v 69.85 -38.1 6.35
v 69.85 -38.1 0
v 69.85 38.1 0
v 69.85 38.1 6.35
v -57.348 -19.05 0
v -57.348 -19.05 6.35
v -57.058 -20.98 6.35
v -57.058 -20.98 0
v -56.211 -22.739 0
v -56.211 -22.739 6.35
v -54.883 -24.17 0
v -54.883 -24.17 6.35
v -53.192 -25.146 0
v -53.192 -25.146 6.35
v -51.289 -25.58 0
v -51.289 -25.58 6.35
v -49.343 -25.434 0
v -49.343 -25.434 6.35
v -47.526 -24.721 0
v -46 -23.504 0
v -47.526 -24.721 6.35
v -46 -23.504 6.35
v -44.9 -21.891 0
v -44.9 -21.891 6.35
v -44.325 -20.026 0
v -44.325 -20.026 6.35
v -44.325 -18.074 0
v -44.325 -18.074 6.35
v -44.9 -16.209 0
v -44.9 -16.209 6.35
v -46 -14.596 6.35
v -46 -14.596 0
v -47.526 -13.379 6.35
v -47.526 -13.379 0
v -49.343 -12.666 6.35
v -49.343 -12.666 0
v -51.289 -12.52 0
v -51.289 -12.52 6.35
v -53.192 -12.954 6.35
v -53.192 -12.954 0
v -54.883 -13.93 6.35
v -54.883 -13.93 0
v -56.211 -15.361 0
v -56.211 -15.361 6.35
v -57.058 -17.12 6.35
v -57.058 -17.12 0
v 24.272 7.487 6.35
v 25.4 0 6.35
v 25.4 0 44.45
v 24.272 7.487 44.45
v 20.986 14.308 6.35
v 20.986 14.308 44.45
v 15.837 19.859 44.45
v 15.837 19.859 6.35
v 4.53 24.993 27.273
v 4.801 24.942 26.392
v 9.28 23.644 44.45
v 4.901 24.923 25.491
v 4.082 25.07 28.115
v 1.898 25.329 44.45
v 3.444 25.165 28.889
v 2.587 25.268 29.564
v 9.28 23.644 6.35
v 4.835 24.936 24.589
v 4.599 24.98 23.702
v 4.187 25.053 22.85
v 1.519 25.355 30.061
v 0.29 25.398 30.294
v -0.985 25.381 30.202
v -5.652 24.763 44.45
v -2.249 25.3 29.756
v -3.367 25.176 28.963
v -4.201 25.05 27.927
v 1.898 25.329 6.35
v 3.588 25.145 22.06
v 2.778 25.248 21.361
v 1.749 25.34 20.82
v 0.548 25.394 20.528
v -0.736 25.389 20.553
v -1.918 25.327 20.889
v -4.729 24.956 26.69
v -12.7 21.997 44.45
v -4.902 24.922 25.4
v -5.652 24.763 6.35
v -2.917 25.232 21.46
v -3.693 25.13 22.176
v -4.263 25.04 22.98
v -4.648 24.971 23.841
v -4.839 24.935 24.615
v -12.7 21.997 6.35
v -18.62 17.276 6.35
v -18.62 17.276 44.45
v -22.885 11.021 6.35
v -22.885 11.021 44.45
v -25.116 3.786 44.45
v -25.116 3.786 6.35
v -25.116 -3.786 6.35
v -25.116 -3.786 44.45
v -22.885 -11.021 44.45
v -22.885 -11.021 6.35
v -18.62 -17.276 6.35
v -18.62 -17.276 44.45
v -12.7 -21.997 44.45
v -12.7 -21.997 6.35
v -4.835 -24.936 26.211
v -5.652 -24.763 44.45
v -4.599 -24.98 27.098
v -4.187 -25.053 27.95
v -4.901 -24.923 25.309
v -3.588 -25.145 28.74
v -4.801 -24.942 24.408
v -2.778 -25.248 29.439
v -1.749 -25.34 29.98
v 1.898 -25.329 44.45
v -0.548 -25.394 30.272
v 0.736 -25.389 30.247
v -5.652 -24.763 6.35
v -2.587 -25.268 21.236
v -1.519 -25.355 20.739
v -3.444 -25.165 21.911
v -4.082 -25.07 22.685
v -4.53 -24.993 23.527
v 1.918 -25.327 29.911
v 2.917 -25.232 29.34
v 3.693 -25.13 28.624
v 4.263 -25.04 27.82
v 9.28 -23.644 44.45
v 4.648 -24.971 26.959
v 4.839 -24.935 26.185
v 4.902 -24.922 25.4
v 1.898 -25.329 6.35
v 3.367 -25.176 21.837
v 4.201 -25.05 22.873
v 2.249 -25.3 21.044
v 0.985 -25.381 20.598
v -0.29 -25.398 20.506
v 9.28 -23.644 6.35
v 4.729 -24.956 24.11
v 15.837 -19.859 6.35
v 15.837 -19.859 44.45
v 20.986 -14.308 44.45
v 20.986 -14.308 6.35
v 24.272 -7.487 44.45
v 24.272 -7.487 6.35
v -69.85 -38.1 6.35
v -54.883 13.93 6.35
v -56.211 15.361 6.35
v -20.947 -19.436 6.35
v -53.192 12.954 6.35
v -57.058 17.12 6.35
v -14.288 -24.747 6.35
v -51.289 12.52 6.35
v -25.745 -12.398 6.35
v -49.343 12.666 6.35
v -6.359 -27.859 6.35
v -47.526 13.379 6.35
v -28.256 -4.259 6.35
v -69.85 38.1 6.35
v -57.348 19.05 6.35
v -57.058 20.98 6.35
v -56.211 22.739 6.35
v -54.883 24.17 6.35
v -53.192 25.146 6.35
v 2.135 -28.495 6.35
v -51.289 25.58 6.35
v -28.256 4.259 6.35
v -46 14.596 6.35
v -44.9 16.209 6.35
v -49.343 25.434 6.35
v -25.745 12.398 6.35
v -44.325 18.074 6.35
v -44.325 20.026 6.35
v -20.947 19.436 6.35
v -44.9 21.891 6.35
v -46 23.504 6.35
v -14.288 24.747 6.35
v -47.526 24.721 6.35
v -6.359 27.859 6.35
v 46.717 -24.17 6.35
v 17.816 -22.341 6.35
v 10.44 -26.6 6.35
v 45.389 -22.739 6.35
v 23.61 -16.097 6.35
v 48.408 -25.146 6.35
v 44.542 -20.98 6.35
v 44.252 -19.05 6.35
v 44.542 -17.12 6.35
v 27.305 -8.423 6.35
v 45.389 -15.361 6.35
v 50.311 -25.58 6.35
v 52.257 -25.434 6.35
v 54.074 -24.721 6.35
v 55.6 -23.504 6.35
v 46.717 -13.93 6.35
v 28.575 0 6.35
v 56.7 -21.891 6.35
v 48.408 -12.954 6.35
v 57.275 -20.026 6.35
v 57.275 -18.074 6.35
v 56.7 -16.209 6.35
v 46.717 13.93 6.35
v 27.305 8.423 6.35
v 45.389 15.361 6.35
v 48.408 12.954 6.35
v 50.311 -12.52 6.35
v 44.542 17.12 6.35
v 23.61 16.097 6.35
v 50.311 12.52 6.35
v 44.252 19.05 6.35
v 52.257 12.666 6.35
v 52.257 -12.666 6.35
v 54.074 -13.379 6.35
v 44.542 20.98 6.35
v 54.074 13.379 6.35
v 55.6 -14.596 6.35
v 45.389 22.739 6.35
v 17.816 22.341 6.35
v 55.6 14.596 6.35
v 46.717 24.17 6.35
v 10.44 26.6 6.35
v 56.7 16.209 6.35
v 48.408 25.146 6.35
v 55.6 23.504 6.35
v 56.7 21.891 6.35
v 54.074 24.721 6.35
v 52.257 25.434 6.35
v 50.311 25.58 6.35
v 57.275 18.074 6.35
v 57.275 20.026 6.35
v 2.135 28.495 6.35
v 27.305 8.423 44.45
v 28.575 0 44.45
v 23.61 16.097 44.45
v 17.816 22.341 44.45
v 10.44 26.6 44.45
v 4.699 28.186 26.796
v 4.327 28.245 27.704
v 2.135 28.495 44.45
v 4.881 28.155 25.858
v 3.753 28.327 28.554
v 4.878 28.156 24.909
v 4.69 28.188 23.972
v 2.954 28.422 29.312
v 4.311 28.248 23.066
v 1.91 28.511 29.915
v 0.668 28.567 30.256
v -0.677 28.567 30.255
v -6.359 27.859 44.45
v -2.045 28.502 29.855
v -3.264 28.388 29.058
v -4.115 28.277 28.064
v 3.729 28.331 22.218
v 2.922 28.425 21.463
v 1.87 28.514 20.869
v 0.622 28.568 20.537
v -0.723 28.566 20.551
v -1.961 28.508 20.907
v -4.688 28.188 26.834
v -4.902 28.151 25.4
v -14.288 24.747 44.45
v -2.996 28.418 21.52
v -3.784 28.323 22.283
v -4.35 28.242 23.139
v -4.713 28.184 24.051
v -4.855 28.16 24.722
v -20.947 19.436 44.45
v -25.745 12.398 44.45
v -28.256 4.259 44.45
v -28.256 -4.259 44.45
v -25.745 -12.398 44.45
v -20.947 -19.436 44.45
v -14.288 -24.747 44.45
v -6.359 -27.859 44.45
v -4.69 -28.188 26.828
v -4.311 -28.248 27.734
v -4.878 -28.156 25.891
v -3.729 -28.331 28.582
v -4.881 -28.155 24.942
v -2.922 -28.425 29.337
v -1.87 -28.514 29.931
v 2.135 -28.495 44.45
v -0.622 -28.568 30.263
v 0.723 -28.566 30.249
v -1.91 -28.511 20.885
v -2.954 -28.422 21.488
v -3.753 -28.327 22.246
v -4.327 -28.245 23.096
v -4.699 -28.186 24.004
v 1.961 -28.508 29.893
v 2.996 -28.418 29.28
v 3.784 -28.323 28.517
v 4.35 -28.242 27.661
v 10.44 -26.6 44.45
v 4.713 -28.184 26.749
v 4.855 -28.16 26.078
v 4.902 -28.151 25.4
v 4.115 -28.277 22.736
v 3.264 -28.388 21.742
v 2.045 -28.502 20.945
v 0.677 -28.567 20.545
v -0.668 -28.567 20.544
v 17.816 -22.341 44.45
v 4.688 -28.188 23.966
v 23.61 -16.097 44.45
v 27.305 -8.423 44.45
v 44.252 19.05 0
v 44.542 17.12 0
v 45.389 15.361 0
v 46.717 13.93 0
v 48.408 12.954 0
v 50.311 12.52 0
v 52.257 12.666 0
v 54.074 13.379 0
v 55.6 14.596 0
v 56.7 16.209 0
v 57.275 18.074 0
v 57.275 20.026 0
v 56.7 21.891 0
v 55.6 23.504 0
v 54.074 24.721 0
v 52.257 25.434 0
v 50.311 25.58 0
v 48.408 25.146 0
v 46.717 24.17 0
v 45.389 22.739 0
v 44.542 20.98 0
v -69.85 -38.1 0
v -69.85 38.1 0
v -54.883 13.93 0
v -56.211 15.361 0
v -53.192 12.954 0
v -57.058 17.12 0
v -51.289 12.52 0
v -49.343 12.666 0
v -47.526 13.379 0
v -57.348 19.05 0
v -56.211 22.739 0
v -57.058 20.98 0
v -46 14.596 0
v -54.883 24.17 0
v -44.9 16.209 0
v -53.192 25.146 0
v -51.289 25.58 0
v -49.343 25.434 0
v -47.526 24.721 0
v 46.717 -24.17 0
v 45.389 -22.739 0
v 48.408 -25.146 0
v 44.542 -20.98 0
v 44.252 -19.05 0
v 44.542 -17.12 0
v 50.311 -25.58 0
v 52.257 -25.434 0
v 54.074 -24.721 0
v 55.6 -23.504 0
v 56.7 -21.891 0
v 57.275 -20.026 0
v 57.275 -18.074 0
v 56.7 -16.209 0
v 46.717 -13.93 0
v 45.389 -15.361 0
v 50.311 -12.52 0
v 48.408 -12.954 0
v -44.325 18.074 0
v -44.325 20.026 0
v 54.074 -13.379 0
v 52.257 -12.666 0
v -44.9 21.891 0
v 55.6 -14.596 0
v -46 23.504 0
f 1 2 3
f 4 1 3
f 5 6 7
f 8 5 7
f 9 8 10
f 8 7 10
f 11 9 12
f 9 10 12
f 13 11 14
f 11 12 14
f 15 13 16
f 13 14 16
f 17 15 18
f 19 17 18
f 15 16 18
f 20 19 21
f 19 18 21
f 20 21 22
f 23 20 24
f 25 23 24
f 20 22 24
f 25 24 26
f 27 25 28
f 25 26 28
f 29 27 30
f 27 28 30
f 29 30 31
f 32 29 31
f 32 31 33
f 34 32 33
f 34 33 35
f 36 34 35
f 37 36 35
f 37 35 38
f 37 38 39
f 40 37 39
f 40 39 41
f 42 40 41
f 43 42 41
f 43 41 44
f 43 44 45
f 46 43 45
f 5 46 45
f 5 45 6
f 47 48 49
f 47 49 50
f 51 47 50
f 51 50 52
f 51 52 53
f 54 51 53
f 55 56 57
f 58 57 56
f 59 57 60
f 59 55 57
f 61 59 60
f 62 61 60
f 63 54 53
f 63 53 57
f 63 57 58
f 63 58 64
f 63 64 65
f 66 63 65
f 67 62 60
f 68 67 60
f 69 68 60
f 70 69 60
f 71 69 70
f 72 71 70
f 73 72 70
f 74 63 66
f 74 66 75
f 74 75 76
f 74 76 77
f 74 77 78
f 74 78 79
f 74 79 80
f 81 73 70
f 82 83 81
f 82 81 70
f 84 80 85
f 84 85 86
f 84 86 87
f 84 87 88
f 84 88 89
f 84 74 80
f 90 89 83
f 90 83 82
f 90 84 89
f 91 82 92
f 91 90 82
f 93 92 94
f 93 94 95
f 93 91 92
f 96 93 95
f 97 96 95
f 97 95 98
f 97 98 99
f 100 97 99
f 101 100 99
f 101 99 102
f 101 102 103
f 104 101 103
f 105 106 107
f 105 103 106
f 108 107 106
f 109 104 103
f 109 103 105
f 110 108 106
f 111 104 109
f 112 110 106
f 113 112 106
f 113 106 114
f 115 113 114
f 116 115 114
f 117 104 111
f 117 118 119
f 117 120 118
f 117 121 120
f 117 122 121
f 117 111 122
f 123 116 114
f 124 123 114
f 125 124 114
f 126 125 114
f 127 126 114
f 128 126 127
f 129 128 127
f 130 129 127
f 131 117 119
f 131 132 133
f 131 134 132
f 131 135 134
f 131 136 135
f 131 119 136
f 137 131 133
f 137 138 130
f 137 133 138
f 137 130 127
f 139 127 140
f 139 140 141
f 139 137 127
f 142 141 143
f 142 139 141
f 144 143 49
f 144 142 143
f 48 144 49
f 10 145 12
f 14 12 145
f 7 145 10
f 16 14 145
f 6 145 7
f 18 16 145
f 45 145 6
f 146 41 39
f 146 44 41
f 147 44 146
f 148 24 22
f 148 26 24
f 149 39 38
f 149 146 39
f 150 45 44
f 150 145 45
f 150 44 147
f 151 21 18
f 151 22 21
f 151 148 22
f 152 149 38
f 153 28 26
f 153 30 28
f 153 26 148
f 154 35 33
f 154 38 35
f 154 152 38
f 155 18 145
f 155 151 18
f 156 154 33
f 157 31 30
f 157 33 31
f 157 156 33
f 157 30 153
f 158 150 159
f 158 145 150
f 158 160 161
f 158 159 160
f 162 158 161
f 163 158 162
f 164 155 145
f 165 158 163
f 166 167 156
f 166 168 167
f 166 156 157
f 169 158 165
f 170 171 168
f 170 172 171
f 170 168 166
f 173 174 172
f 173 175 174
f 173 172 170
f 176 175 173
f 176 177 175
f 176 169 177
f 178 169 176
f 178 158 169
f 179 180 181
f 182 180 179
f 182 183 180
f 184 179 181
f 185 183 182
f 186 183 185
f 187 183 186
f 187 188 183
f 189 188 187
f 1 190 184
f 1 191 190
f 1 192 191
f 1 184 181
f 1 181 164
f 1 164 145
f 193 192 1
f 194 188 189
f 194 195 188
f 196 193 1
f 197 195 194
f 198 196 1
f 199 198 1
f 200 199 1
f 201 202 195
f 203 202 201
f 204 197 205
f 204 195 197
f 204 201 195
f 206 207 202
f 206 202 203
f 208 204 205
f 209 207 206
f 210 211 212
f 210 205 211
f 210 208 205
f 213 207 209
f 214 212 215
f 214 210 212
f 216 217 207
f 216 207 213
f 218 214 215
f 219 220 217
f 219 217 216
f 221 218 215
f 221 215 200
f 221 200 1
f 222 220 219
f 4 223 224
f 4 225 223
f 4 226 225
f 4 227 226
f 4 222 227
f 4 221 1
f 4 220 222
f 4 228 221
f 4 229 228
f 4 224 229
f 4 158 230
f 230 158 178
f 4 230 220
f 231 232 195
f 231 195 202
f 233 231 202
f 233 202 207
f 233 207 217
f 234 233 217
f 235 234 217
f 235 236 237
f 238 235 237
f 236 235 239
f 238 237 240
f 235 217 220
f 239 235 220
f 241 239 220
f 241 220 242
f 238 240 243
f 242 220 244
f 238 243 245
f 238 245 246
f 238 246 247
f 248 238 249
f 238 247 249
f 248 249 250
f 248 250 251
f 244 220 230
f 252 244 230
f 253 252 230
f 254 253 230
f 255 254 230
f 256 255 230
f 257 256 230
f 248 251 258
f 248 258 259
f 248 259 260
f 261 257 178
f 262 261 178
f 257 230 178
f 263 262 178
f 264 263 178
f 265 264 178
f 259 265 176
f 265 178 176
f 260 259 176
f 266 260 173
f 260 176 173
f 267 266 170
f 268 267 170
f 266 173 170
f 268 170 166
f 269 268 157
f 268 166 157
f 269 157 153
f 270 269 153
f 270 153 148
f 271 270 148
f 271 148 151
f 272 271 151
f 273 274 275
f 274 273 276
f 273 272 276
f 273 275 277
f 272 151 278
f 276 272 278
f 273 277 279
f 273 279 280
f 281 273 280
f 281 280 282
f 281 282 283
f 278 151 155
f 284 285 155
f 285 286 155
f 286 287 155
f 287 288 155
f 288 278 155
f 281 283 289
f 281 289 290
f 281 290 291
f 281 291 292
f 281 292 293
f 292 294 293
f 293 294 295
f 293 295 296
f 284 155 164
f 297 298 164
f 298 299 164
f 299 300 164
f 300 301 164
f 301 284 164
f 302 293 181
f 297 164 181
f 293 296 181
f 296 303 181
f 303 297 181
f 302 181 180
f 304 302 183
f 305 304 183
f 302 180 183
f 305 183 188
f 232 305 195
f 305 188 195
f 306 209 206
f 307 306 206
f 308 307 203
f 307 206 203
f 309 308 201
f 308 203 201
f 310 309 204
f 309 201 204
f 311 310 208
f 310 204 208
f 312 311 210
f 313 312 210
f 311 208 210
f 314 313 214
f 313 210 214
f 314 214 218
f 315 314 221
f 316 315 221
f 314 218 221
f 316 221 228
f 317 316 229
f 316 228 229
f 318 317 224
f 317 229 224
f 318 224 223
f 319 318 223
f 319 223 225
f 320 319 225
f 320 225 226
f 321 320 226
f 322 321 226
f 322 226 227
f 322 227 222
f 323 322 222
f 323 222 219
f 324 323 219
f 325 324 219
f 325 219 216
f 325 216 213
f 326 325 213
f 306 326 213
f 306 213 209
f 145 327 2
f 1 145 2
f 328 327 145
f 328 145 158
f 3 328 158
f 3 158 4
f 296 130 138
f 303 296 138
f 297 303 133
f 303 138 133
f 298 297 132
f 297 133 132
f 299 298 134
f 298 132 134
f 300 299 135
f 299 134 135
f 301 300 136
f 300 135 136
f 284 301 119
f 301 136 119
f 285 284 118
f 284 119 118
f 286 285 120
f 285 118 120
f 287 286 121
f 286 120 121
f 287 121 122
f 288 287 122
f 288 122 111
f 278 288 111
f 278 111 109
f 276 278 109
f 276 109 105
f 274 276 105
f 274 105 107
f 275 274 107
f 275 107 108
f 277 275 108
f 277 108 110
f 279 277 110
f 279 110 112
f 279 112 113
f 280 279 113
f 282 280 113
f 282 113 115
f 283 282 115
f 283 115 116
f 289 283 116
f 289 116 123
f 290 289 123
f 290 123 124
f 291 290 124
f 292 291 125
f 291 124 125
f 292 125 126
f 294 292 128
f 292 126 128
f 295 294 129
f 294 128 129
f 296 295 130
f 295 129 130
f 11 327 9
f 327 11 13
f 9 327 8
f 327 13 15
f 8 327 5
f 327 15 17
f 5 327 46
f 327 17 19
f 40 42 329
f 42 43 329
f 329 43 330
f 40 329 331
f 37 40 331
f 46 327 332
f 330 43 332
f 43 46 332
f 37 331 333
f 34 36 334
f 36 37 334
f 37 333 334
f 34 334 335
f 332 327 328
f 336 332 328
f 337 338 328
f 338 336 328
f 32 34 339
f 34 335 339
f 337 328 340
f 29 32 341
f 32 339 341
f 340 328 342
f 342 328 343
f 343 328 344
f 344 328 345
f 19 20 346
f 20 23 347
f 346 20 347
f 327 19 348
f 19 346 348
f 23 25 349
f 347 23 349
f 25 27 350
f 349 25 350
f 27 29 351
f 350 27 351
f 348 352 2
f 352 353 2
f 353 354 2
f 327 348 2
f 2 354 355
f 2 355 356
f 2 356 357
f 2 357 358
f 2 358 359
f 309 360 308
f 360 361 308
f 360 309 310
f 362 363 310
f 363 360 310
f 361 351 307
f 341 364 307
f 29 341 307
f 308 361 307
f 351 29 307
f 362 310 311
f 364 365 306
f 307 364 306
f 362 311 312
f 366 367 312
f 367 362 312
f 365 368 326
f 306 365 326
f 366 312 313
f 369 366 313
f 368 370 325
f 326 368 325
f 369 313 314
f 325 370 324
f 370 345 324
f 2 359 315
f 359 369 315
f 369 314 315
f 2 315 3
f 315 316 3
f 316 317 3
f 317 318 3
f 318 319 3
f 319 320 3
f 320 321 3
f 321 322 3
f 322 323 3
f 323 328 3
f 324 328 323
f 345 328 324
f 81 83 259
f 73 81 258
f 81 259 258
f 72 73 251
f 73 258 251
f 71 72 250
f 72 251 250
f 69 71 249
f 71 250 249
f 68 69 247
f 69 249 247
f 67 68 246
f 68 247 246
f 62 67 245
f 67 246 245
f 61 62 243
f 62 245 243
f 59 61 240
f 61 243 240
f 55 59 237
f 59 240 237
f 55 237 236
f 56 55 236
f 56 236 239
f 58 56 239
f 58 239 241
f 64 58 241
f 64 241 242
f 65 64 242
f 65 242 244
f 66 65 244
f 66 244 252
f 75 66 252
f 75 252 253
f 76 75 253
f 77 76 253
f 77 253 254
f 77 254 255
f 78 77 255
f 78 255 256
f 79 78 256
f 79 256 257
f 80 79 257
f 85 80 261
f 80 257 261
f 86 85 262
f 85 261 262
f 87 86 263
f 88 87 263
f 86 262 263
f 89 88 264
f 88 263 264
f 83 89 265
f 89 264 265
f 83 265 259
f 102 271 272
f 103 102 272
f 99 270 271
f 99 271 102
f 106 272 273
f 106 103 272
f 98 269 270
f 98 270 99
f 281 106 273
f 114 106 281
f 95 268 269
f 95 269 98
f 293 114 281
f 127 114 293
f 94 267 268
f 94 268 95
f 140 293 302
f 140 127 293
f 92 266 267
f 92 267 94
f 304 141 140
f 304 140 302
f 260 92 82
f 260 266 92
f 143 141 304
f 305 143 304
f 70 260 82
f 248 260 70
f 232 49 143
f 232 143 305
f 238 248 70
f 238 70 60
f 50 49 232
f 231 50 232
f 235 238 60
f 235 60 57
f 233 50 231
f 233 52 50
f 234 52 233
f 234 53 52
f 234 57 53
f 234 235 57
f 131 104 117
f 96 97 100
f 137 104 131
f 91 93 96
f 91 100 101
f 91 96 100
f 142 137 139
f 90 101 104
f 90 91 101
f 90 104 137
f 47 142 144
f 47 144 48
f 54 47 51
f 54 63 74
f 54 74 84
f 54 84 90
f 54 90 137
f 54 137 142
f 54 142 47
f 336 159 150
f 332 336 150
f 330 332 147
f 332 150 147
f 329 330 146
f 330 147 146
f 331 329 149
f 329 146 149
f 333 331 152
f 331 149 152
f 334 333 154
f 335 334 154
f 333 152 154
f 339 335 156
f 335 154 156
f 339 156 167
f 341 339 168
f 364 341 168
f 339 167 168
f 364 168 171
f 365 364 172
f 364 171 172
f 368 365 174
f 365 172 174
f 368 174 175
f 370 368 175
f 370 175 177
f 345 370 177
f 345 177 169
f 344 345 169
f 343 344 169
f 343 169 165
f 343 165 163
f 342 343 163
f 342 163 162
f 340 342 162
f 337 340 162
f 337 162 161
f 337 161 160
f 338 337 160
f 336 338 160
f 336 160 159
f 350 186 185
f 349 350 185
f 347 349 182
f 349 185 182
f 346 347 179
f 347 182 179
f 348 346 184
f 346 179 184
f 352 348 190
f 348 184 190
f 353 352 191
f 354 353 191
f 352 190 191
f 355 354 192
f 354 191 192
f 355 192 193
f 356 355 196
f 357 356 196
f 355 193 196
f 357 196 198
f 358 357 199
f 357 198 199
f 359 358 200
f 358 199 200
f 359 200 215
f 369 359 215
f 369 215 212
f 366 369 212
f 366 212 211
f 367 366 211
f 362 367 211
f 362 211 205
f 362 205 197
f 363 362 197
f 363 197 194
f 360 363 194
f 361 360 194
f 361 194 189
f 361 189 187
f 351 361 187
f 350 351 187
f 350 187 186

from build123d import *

# Parameters (mm, degrees)
F0_R     = 25.4
F1_DEPTH = 6.35
F0_W     = 139.7
F0_H     = 76.2
F0_R_2   = 28.575
F2_DEPTH = 44.45
F3_D     = 13.096875
F5_D     = 9.8044
F5_DEPTH = 38.101
F6_D     = 9.8044


with BuildPart() as f1:
    # F0 (on Top) → F1 (new body)
    with BuildSketch(Plane.XY):
        Circle(F0_R)
    extrude(amount=F1_DEPTH)



with BuildPart() as f1b:
    # F0 (on Top) → F1, piece 2 (new body)
    with BuildSketch(Plane.XY):
        Rectangle(F0_W, F0_H)
        Circle(F0_R_2, mode=Mode.SUBTRACT)
    extrude(amount=F1_DEPTH)


with BuildPart() as f1_1:
    add(f1.part)

    add(f1b.part)  # F2 merges F1b
    # F0 (on Top) → F2 (join)
    with BuildSketch(Plane.XY):
        Circle(F0_R_2)
        Circle(F0_R, mode=Mode.SUBTRACT)
    extrude(amount=F2_DEPTH)

    # F3 (through all)
    with Locations(Plane(origin=(0, 0, 0), x_dir=(1, 0, 0), z_dir=(0, 0, -1))):
        with Locations((-50.8, -19.05), (50.8, -19.05), (50.8, 19.05), (-50.8, 19.05)):
            Hole(F3_D / 2)

    # F5 (through all, one way)
    with BuildSketch(Plane(origin=(0, 0, 0), x_dir=(1, 0, 0), z_dir=(0, 1, 0))):
        with Locations((0, -25.4)):
            Circle(F5_D / 2)
    extrude(amount=-F5_DEPTH, mode=Mode.SUBTRACT)

    # F6 (through all)
    with Locations(Plane.XZ):
        with Locations((0, 25.4)):
            Hole(F6_D / 2)


solid = f1_1.part
